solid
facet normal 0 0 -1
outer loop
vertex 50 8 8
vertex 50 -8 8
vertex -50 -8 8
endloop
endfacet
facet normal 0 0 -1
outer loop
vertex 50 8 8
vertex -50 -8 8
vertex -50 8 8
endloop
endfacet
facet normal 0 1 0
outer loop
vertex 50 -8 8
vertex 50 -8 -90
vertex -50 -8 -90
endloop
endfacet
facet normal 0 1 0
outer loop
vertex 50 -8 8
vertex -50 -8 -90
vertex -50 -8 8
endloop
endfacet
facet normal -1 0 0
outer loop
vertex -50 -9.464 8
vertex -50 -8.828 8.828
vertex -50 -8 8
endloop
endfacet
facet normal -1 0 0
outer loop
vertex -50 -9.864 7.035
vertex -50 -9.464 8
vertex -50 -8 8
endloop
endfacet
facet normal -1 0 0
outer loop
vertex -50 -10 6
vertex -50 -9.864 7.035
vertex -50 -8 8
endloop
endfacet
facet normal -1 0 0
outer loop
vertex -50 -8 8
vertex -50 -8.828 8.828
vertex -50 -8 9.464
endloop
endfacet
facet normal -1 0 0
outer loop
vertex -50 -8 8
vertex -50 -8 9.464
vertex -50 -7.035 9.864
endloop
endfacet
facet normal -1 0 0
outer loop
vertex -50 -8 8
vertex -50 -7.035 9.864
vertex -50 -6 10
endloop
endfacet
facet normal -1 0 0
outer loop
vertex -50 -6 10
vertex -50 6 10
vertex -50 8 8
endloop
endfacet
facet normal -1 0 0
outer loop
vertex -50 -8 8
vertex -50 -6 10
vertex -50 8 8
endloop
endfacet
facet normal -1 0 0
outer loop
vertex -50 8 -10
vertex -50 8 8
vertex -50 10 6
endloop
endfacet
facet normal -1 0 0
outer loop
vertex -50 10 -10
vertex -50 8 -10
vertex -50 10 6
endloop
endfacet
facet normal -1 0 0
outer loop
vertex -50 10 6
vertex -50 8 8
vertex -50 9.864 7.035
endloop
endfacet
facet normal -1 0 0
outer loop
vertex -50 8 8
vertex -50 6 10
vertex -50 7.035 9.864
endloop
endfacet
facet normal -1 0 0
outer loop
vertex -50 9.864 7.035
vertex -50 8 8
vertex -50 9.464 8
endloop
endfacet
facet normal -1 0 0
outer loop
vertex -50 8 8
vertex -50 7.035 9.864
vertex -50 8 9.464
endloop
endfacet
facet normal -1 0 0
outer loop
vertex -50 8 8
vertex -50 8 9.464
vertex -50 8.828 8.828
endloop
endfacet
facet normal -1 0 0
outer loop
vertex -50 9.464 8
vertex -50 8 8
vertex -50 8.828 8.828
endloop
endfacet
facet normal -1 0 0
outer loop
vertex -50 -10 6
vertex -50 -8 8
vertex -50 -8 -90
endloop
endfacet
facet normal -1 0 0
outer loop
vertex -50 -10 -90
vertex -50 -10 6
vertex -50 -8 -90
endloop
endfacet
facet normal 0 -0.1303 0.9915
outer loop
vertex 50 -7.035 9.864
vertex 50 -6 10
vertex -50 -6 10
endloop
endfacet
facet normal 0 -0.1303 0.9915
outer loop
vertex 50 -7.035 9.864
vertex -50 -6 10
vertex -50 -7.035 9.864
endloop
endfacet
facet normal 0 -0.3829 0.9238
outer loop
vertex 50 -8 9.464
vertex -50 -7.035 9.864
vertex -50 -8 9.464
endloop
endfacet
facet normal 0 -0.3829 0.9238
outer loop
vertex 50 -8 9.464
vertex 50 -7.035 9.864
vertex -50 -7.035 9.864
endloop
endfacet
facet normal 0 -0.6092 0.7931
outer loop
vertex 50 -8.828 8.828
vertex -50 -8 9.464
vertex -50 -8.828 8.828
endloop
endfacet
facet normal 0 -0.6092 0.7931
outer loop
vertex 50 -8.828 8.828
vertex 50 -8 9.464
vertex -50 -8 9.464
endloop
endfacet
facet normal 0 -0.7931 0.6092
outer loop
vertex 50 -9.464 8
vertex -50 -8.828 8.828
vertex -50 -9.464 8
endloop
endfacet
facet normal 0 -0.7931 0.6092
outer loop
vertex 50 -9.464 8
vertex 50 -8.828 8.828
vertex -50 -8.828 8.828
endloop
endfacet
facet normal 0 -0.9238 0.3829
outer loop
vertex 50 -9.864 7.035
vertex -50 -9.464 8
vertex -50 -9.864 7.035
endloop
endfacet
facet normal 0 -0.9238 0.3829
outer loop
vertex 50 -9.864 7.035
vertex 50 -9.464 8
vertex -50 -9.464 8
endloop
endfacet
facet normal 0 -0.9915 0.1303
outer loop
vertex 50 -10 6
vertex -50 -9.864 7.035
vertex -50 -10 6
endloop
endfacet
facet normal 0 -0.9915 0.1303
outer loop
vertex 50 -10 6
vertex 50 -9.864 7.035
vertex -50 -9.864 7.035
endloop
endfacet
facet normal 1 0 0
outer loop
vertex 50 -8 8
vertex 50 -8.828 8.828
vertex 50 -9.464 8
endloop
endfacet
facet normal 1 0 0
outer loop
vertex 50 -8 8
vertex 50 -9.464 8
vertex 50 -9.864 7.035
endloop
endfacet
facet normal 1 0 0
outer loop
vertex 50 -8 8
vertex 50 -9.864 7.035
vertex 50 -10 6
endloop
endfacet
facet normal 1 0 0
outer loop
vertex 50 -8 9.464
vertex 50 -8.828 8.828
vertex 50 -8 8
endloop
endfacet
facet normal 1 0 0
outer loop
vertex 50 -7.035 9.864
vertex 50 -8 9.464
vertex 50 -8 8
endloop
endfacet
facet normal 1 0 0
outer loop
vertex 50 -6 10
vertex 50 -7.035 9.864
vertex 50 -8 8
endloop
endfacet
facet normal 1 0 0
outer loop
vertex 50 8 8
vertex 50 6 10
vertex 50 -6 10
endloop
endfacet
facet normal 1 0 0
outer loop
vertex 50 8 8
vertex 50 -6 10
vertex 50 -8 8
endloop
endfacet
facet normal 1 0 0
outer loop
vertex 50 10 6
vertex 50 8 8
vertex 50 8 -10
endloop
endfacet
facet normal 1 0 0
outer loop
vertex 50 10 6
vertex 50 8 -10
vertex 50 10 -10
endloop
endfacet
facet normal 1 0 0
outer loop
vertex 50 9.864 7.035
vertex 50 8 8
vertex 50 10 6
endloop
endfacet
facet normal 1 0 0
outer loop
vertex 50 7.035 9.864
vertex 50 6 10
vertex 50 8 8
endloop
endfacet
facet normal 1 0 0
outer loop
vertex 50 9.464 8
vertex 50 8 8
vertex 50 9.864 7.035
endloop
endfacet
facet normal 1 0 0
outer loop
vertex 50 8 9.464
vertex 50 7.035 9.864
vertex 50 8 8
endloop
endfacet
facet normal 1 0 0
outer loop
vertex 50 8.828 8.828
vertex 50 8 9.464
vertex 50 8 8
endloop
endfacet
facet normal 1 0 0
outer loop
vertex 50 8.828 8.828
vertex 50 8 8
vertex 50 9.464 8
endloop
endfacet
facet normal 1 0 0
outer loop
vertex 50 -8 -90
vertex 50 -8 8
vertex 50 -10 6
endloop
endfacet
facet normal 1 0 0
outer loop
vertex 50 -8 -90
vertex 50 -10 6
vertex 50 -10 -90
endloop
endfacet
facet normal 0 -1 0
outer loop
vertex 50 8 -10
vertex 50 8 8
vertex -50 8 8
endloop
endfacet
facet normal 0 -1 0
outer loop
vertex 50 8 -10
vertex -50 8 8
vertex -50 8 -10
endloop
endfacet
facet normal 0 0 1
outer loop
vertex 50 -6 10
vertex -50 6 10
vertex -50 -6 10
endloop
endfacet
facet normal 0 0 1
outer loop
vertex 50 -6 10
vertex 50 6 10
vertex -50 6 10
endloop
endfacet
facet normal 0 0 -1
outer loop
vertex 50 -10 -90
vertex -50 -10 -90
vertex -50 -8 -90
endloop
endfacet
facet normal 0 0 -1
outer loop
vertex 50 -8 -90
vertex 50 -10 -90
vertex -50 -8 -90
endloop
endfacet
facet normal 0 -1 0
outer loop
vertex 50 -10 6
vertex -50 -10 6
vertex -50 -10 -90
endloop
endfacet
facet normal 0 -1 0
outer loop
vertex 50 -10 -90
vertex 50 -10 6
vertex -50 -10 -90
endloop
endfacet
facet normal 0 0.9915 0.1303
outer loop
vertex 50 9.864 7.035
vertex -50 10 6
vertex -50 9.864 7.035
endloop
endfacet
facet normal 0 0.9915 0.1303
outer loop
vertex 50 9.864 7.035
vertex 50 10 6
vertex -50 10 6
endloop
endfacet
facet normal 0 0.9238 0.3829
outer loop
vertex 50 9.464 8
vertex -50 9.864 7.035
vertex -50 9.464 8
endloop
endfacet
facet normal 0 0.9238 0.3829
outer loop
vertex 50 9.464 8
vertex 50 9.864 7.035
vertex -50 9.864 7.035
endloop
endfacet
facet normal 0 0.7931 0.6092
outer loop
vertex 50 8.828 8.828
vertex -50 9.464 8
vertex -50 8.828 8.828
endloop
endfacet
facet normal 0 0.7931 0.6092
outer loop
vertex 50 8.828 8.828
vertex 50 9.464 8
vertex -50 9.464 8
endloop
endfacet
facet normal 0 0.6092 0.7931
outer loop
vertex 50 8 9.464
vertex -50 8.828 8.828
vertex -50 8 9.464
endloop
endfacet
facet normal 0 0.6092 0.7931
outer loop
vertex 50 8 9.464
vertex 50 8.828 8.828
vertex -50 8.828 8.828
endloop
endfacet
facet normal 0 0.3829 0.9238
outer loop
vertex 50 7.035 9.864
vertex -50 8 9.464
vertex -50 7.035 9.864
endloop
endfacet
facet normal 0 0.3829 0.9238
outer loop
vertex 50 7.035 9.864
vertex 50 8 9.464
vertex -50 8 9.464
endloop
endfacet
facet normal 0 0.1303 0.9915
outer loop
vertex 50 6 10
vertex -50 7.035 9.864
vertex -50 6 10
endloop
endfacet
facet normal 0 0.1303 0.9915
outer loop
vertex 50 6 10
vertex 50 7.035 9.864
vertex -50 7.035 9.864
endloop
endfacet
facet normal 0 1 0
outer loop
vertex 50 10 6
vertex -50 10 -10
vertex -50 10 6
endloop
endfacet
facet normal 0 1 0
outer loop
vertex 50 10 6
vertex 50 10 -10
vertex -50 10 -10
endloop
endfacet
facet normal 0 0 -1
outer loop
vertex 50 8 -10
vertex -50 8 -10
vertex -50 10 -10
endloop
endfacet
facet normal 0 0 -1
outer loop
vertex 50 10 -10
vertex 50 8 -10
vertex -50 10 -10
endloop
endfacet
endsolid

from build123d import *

# Parameters (mm, degrees)
F1_DEPTH = 50


with BuildPart() as f1:
    # F0 (on Right) → F1 (new body, symmetric)
    with BuildSketch(Plane.YZ):
        with BuildLine():
            Line((6, 10), (-6, 10))
            ThreePointArc((-6, 10), (-8.828427, 8.828427), (-10, 6))
            Line((-10, 6), (-10, -10))
            Line((-10, -10), (-10, -90))
            Line((-10, -90), (-8, -90))
            Line((-8, -90), (-8, -10))
            Line((-8, -10), (-8, 8))
            Line((-8, 8), (8, 8))
            Line((8, 8), (8, -10))
            Line((8, -10), (10, -10))
            Line((10, -10), (10, 6))
            ThreePointArc((10, 6), (8.828427, 8.828427), (6, 10))
        make_face()
    extrude(amount=F1_DEPTH, both=True)


solid = f1.part
